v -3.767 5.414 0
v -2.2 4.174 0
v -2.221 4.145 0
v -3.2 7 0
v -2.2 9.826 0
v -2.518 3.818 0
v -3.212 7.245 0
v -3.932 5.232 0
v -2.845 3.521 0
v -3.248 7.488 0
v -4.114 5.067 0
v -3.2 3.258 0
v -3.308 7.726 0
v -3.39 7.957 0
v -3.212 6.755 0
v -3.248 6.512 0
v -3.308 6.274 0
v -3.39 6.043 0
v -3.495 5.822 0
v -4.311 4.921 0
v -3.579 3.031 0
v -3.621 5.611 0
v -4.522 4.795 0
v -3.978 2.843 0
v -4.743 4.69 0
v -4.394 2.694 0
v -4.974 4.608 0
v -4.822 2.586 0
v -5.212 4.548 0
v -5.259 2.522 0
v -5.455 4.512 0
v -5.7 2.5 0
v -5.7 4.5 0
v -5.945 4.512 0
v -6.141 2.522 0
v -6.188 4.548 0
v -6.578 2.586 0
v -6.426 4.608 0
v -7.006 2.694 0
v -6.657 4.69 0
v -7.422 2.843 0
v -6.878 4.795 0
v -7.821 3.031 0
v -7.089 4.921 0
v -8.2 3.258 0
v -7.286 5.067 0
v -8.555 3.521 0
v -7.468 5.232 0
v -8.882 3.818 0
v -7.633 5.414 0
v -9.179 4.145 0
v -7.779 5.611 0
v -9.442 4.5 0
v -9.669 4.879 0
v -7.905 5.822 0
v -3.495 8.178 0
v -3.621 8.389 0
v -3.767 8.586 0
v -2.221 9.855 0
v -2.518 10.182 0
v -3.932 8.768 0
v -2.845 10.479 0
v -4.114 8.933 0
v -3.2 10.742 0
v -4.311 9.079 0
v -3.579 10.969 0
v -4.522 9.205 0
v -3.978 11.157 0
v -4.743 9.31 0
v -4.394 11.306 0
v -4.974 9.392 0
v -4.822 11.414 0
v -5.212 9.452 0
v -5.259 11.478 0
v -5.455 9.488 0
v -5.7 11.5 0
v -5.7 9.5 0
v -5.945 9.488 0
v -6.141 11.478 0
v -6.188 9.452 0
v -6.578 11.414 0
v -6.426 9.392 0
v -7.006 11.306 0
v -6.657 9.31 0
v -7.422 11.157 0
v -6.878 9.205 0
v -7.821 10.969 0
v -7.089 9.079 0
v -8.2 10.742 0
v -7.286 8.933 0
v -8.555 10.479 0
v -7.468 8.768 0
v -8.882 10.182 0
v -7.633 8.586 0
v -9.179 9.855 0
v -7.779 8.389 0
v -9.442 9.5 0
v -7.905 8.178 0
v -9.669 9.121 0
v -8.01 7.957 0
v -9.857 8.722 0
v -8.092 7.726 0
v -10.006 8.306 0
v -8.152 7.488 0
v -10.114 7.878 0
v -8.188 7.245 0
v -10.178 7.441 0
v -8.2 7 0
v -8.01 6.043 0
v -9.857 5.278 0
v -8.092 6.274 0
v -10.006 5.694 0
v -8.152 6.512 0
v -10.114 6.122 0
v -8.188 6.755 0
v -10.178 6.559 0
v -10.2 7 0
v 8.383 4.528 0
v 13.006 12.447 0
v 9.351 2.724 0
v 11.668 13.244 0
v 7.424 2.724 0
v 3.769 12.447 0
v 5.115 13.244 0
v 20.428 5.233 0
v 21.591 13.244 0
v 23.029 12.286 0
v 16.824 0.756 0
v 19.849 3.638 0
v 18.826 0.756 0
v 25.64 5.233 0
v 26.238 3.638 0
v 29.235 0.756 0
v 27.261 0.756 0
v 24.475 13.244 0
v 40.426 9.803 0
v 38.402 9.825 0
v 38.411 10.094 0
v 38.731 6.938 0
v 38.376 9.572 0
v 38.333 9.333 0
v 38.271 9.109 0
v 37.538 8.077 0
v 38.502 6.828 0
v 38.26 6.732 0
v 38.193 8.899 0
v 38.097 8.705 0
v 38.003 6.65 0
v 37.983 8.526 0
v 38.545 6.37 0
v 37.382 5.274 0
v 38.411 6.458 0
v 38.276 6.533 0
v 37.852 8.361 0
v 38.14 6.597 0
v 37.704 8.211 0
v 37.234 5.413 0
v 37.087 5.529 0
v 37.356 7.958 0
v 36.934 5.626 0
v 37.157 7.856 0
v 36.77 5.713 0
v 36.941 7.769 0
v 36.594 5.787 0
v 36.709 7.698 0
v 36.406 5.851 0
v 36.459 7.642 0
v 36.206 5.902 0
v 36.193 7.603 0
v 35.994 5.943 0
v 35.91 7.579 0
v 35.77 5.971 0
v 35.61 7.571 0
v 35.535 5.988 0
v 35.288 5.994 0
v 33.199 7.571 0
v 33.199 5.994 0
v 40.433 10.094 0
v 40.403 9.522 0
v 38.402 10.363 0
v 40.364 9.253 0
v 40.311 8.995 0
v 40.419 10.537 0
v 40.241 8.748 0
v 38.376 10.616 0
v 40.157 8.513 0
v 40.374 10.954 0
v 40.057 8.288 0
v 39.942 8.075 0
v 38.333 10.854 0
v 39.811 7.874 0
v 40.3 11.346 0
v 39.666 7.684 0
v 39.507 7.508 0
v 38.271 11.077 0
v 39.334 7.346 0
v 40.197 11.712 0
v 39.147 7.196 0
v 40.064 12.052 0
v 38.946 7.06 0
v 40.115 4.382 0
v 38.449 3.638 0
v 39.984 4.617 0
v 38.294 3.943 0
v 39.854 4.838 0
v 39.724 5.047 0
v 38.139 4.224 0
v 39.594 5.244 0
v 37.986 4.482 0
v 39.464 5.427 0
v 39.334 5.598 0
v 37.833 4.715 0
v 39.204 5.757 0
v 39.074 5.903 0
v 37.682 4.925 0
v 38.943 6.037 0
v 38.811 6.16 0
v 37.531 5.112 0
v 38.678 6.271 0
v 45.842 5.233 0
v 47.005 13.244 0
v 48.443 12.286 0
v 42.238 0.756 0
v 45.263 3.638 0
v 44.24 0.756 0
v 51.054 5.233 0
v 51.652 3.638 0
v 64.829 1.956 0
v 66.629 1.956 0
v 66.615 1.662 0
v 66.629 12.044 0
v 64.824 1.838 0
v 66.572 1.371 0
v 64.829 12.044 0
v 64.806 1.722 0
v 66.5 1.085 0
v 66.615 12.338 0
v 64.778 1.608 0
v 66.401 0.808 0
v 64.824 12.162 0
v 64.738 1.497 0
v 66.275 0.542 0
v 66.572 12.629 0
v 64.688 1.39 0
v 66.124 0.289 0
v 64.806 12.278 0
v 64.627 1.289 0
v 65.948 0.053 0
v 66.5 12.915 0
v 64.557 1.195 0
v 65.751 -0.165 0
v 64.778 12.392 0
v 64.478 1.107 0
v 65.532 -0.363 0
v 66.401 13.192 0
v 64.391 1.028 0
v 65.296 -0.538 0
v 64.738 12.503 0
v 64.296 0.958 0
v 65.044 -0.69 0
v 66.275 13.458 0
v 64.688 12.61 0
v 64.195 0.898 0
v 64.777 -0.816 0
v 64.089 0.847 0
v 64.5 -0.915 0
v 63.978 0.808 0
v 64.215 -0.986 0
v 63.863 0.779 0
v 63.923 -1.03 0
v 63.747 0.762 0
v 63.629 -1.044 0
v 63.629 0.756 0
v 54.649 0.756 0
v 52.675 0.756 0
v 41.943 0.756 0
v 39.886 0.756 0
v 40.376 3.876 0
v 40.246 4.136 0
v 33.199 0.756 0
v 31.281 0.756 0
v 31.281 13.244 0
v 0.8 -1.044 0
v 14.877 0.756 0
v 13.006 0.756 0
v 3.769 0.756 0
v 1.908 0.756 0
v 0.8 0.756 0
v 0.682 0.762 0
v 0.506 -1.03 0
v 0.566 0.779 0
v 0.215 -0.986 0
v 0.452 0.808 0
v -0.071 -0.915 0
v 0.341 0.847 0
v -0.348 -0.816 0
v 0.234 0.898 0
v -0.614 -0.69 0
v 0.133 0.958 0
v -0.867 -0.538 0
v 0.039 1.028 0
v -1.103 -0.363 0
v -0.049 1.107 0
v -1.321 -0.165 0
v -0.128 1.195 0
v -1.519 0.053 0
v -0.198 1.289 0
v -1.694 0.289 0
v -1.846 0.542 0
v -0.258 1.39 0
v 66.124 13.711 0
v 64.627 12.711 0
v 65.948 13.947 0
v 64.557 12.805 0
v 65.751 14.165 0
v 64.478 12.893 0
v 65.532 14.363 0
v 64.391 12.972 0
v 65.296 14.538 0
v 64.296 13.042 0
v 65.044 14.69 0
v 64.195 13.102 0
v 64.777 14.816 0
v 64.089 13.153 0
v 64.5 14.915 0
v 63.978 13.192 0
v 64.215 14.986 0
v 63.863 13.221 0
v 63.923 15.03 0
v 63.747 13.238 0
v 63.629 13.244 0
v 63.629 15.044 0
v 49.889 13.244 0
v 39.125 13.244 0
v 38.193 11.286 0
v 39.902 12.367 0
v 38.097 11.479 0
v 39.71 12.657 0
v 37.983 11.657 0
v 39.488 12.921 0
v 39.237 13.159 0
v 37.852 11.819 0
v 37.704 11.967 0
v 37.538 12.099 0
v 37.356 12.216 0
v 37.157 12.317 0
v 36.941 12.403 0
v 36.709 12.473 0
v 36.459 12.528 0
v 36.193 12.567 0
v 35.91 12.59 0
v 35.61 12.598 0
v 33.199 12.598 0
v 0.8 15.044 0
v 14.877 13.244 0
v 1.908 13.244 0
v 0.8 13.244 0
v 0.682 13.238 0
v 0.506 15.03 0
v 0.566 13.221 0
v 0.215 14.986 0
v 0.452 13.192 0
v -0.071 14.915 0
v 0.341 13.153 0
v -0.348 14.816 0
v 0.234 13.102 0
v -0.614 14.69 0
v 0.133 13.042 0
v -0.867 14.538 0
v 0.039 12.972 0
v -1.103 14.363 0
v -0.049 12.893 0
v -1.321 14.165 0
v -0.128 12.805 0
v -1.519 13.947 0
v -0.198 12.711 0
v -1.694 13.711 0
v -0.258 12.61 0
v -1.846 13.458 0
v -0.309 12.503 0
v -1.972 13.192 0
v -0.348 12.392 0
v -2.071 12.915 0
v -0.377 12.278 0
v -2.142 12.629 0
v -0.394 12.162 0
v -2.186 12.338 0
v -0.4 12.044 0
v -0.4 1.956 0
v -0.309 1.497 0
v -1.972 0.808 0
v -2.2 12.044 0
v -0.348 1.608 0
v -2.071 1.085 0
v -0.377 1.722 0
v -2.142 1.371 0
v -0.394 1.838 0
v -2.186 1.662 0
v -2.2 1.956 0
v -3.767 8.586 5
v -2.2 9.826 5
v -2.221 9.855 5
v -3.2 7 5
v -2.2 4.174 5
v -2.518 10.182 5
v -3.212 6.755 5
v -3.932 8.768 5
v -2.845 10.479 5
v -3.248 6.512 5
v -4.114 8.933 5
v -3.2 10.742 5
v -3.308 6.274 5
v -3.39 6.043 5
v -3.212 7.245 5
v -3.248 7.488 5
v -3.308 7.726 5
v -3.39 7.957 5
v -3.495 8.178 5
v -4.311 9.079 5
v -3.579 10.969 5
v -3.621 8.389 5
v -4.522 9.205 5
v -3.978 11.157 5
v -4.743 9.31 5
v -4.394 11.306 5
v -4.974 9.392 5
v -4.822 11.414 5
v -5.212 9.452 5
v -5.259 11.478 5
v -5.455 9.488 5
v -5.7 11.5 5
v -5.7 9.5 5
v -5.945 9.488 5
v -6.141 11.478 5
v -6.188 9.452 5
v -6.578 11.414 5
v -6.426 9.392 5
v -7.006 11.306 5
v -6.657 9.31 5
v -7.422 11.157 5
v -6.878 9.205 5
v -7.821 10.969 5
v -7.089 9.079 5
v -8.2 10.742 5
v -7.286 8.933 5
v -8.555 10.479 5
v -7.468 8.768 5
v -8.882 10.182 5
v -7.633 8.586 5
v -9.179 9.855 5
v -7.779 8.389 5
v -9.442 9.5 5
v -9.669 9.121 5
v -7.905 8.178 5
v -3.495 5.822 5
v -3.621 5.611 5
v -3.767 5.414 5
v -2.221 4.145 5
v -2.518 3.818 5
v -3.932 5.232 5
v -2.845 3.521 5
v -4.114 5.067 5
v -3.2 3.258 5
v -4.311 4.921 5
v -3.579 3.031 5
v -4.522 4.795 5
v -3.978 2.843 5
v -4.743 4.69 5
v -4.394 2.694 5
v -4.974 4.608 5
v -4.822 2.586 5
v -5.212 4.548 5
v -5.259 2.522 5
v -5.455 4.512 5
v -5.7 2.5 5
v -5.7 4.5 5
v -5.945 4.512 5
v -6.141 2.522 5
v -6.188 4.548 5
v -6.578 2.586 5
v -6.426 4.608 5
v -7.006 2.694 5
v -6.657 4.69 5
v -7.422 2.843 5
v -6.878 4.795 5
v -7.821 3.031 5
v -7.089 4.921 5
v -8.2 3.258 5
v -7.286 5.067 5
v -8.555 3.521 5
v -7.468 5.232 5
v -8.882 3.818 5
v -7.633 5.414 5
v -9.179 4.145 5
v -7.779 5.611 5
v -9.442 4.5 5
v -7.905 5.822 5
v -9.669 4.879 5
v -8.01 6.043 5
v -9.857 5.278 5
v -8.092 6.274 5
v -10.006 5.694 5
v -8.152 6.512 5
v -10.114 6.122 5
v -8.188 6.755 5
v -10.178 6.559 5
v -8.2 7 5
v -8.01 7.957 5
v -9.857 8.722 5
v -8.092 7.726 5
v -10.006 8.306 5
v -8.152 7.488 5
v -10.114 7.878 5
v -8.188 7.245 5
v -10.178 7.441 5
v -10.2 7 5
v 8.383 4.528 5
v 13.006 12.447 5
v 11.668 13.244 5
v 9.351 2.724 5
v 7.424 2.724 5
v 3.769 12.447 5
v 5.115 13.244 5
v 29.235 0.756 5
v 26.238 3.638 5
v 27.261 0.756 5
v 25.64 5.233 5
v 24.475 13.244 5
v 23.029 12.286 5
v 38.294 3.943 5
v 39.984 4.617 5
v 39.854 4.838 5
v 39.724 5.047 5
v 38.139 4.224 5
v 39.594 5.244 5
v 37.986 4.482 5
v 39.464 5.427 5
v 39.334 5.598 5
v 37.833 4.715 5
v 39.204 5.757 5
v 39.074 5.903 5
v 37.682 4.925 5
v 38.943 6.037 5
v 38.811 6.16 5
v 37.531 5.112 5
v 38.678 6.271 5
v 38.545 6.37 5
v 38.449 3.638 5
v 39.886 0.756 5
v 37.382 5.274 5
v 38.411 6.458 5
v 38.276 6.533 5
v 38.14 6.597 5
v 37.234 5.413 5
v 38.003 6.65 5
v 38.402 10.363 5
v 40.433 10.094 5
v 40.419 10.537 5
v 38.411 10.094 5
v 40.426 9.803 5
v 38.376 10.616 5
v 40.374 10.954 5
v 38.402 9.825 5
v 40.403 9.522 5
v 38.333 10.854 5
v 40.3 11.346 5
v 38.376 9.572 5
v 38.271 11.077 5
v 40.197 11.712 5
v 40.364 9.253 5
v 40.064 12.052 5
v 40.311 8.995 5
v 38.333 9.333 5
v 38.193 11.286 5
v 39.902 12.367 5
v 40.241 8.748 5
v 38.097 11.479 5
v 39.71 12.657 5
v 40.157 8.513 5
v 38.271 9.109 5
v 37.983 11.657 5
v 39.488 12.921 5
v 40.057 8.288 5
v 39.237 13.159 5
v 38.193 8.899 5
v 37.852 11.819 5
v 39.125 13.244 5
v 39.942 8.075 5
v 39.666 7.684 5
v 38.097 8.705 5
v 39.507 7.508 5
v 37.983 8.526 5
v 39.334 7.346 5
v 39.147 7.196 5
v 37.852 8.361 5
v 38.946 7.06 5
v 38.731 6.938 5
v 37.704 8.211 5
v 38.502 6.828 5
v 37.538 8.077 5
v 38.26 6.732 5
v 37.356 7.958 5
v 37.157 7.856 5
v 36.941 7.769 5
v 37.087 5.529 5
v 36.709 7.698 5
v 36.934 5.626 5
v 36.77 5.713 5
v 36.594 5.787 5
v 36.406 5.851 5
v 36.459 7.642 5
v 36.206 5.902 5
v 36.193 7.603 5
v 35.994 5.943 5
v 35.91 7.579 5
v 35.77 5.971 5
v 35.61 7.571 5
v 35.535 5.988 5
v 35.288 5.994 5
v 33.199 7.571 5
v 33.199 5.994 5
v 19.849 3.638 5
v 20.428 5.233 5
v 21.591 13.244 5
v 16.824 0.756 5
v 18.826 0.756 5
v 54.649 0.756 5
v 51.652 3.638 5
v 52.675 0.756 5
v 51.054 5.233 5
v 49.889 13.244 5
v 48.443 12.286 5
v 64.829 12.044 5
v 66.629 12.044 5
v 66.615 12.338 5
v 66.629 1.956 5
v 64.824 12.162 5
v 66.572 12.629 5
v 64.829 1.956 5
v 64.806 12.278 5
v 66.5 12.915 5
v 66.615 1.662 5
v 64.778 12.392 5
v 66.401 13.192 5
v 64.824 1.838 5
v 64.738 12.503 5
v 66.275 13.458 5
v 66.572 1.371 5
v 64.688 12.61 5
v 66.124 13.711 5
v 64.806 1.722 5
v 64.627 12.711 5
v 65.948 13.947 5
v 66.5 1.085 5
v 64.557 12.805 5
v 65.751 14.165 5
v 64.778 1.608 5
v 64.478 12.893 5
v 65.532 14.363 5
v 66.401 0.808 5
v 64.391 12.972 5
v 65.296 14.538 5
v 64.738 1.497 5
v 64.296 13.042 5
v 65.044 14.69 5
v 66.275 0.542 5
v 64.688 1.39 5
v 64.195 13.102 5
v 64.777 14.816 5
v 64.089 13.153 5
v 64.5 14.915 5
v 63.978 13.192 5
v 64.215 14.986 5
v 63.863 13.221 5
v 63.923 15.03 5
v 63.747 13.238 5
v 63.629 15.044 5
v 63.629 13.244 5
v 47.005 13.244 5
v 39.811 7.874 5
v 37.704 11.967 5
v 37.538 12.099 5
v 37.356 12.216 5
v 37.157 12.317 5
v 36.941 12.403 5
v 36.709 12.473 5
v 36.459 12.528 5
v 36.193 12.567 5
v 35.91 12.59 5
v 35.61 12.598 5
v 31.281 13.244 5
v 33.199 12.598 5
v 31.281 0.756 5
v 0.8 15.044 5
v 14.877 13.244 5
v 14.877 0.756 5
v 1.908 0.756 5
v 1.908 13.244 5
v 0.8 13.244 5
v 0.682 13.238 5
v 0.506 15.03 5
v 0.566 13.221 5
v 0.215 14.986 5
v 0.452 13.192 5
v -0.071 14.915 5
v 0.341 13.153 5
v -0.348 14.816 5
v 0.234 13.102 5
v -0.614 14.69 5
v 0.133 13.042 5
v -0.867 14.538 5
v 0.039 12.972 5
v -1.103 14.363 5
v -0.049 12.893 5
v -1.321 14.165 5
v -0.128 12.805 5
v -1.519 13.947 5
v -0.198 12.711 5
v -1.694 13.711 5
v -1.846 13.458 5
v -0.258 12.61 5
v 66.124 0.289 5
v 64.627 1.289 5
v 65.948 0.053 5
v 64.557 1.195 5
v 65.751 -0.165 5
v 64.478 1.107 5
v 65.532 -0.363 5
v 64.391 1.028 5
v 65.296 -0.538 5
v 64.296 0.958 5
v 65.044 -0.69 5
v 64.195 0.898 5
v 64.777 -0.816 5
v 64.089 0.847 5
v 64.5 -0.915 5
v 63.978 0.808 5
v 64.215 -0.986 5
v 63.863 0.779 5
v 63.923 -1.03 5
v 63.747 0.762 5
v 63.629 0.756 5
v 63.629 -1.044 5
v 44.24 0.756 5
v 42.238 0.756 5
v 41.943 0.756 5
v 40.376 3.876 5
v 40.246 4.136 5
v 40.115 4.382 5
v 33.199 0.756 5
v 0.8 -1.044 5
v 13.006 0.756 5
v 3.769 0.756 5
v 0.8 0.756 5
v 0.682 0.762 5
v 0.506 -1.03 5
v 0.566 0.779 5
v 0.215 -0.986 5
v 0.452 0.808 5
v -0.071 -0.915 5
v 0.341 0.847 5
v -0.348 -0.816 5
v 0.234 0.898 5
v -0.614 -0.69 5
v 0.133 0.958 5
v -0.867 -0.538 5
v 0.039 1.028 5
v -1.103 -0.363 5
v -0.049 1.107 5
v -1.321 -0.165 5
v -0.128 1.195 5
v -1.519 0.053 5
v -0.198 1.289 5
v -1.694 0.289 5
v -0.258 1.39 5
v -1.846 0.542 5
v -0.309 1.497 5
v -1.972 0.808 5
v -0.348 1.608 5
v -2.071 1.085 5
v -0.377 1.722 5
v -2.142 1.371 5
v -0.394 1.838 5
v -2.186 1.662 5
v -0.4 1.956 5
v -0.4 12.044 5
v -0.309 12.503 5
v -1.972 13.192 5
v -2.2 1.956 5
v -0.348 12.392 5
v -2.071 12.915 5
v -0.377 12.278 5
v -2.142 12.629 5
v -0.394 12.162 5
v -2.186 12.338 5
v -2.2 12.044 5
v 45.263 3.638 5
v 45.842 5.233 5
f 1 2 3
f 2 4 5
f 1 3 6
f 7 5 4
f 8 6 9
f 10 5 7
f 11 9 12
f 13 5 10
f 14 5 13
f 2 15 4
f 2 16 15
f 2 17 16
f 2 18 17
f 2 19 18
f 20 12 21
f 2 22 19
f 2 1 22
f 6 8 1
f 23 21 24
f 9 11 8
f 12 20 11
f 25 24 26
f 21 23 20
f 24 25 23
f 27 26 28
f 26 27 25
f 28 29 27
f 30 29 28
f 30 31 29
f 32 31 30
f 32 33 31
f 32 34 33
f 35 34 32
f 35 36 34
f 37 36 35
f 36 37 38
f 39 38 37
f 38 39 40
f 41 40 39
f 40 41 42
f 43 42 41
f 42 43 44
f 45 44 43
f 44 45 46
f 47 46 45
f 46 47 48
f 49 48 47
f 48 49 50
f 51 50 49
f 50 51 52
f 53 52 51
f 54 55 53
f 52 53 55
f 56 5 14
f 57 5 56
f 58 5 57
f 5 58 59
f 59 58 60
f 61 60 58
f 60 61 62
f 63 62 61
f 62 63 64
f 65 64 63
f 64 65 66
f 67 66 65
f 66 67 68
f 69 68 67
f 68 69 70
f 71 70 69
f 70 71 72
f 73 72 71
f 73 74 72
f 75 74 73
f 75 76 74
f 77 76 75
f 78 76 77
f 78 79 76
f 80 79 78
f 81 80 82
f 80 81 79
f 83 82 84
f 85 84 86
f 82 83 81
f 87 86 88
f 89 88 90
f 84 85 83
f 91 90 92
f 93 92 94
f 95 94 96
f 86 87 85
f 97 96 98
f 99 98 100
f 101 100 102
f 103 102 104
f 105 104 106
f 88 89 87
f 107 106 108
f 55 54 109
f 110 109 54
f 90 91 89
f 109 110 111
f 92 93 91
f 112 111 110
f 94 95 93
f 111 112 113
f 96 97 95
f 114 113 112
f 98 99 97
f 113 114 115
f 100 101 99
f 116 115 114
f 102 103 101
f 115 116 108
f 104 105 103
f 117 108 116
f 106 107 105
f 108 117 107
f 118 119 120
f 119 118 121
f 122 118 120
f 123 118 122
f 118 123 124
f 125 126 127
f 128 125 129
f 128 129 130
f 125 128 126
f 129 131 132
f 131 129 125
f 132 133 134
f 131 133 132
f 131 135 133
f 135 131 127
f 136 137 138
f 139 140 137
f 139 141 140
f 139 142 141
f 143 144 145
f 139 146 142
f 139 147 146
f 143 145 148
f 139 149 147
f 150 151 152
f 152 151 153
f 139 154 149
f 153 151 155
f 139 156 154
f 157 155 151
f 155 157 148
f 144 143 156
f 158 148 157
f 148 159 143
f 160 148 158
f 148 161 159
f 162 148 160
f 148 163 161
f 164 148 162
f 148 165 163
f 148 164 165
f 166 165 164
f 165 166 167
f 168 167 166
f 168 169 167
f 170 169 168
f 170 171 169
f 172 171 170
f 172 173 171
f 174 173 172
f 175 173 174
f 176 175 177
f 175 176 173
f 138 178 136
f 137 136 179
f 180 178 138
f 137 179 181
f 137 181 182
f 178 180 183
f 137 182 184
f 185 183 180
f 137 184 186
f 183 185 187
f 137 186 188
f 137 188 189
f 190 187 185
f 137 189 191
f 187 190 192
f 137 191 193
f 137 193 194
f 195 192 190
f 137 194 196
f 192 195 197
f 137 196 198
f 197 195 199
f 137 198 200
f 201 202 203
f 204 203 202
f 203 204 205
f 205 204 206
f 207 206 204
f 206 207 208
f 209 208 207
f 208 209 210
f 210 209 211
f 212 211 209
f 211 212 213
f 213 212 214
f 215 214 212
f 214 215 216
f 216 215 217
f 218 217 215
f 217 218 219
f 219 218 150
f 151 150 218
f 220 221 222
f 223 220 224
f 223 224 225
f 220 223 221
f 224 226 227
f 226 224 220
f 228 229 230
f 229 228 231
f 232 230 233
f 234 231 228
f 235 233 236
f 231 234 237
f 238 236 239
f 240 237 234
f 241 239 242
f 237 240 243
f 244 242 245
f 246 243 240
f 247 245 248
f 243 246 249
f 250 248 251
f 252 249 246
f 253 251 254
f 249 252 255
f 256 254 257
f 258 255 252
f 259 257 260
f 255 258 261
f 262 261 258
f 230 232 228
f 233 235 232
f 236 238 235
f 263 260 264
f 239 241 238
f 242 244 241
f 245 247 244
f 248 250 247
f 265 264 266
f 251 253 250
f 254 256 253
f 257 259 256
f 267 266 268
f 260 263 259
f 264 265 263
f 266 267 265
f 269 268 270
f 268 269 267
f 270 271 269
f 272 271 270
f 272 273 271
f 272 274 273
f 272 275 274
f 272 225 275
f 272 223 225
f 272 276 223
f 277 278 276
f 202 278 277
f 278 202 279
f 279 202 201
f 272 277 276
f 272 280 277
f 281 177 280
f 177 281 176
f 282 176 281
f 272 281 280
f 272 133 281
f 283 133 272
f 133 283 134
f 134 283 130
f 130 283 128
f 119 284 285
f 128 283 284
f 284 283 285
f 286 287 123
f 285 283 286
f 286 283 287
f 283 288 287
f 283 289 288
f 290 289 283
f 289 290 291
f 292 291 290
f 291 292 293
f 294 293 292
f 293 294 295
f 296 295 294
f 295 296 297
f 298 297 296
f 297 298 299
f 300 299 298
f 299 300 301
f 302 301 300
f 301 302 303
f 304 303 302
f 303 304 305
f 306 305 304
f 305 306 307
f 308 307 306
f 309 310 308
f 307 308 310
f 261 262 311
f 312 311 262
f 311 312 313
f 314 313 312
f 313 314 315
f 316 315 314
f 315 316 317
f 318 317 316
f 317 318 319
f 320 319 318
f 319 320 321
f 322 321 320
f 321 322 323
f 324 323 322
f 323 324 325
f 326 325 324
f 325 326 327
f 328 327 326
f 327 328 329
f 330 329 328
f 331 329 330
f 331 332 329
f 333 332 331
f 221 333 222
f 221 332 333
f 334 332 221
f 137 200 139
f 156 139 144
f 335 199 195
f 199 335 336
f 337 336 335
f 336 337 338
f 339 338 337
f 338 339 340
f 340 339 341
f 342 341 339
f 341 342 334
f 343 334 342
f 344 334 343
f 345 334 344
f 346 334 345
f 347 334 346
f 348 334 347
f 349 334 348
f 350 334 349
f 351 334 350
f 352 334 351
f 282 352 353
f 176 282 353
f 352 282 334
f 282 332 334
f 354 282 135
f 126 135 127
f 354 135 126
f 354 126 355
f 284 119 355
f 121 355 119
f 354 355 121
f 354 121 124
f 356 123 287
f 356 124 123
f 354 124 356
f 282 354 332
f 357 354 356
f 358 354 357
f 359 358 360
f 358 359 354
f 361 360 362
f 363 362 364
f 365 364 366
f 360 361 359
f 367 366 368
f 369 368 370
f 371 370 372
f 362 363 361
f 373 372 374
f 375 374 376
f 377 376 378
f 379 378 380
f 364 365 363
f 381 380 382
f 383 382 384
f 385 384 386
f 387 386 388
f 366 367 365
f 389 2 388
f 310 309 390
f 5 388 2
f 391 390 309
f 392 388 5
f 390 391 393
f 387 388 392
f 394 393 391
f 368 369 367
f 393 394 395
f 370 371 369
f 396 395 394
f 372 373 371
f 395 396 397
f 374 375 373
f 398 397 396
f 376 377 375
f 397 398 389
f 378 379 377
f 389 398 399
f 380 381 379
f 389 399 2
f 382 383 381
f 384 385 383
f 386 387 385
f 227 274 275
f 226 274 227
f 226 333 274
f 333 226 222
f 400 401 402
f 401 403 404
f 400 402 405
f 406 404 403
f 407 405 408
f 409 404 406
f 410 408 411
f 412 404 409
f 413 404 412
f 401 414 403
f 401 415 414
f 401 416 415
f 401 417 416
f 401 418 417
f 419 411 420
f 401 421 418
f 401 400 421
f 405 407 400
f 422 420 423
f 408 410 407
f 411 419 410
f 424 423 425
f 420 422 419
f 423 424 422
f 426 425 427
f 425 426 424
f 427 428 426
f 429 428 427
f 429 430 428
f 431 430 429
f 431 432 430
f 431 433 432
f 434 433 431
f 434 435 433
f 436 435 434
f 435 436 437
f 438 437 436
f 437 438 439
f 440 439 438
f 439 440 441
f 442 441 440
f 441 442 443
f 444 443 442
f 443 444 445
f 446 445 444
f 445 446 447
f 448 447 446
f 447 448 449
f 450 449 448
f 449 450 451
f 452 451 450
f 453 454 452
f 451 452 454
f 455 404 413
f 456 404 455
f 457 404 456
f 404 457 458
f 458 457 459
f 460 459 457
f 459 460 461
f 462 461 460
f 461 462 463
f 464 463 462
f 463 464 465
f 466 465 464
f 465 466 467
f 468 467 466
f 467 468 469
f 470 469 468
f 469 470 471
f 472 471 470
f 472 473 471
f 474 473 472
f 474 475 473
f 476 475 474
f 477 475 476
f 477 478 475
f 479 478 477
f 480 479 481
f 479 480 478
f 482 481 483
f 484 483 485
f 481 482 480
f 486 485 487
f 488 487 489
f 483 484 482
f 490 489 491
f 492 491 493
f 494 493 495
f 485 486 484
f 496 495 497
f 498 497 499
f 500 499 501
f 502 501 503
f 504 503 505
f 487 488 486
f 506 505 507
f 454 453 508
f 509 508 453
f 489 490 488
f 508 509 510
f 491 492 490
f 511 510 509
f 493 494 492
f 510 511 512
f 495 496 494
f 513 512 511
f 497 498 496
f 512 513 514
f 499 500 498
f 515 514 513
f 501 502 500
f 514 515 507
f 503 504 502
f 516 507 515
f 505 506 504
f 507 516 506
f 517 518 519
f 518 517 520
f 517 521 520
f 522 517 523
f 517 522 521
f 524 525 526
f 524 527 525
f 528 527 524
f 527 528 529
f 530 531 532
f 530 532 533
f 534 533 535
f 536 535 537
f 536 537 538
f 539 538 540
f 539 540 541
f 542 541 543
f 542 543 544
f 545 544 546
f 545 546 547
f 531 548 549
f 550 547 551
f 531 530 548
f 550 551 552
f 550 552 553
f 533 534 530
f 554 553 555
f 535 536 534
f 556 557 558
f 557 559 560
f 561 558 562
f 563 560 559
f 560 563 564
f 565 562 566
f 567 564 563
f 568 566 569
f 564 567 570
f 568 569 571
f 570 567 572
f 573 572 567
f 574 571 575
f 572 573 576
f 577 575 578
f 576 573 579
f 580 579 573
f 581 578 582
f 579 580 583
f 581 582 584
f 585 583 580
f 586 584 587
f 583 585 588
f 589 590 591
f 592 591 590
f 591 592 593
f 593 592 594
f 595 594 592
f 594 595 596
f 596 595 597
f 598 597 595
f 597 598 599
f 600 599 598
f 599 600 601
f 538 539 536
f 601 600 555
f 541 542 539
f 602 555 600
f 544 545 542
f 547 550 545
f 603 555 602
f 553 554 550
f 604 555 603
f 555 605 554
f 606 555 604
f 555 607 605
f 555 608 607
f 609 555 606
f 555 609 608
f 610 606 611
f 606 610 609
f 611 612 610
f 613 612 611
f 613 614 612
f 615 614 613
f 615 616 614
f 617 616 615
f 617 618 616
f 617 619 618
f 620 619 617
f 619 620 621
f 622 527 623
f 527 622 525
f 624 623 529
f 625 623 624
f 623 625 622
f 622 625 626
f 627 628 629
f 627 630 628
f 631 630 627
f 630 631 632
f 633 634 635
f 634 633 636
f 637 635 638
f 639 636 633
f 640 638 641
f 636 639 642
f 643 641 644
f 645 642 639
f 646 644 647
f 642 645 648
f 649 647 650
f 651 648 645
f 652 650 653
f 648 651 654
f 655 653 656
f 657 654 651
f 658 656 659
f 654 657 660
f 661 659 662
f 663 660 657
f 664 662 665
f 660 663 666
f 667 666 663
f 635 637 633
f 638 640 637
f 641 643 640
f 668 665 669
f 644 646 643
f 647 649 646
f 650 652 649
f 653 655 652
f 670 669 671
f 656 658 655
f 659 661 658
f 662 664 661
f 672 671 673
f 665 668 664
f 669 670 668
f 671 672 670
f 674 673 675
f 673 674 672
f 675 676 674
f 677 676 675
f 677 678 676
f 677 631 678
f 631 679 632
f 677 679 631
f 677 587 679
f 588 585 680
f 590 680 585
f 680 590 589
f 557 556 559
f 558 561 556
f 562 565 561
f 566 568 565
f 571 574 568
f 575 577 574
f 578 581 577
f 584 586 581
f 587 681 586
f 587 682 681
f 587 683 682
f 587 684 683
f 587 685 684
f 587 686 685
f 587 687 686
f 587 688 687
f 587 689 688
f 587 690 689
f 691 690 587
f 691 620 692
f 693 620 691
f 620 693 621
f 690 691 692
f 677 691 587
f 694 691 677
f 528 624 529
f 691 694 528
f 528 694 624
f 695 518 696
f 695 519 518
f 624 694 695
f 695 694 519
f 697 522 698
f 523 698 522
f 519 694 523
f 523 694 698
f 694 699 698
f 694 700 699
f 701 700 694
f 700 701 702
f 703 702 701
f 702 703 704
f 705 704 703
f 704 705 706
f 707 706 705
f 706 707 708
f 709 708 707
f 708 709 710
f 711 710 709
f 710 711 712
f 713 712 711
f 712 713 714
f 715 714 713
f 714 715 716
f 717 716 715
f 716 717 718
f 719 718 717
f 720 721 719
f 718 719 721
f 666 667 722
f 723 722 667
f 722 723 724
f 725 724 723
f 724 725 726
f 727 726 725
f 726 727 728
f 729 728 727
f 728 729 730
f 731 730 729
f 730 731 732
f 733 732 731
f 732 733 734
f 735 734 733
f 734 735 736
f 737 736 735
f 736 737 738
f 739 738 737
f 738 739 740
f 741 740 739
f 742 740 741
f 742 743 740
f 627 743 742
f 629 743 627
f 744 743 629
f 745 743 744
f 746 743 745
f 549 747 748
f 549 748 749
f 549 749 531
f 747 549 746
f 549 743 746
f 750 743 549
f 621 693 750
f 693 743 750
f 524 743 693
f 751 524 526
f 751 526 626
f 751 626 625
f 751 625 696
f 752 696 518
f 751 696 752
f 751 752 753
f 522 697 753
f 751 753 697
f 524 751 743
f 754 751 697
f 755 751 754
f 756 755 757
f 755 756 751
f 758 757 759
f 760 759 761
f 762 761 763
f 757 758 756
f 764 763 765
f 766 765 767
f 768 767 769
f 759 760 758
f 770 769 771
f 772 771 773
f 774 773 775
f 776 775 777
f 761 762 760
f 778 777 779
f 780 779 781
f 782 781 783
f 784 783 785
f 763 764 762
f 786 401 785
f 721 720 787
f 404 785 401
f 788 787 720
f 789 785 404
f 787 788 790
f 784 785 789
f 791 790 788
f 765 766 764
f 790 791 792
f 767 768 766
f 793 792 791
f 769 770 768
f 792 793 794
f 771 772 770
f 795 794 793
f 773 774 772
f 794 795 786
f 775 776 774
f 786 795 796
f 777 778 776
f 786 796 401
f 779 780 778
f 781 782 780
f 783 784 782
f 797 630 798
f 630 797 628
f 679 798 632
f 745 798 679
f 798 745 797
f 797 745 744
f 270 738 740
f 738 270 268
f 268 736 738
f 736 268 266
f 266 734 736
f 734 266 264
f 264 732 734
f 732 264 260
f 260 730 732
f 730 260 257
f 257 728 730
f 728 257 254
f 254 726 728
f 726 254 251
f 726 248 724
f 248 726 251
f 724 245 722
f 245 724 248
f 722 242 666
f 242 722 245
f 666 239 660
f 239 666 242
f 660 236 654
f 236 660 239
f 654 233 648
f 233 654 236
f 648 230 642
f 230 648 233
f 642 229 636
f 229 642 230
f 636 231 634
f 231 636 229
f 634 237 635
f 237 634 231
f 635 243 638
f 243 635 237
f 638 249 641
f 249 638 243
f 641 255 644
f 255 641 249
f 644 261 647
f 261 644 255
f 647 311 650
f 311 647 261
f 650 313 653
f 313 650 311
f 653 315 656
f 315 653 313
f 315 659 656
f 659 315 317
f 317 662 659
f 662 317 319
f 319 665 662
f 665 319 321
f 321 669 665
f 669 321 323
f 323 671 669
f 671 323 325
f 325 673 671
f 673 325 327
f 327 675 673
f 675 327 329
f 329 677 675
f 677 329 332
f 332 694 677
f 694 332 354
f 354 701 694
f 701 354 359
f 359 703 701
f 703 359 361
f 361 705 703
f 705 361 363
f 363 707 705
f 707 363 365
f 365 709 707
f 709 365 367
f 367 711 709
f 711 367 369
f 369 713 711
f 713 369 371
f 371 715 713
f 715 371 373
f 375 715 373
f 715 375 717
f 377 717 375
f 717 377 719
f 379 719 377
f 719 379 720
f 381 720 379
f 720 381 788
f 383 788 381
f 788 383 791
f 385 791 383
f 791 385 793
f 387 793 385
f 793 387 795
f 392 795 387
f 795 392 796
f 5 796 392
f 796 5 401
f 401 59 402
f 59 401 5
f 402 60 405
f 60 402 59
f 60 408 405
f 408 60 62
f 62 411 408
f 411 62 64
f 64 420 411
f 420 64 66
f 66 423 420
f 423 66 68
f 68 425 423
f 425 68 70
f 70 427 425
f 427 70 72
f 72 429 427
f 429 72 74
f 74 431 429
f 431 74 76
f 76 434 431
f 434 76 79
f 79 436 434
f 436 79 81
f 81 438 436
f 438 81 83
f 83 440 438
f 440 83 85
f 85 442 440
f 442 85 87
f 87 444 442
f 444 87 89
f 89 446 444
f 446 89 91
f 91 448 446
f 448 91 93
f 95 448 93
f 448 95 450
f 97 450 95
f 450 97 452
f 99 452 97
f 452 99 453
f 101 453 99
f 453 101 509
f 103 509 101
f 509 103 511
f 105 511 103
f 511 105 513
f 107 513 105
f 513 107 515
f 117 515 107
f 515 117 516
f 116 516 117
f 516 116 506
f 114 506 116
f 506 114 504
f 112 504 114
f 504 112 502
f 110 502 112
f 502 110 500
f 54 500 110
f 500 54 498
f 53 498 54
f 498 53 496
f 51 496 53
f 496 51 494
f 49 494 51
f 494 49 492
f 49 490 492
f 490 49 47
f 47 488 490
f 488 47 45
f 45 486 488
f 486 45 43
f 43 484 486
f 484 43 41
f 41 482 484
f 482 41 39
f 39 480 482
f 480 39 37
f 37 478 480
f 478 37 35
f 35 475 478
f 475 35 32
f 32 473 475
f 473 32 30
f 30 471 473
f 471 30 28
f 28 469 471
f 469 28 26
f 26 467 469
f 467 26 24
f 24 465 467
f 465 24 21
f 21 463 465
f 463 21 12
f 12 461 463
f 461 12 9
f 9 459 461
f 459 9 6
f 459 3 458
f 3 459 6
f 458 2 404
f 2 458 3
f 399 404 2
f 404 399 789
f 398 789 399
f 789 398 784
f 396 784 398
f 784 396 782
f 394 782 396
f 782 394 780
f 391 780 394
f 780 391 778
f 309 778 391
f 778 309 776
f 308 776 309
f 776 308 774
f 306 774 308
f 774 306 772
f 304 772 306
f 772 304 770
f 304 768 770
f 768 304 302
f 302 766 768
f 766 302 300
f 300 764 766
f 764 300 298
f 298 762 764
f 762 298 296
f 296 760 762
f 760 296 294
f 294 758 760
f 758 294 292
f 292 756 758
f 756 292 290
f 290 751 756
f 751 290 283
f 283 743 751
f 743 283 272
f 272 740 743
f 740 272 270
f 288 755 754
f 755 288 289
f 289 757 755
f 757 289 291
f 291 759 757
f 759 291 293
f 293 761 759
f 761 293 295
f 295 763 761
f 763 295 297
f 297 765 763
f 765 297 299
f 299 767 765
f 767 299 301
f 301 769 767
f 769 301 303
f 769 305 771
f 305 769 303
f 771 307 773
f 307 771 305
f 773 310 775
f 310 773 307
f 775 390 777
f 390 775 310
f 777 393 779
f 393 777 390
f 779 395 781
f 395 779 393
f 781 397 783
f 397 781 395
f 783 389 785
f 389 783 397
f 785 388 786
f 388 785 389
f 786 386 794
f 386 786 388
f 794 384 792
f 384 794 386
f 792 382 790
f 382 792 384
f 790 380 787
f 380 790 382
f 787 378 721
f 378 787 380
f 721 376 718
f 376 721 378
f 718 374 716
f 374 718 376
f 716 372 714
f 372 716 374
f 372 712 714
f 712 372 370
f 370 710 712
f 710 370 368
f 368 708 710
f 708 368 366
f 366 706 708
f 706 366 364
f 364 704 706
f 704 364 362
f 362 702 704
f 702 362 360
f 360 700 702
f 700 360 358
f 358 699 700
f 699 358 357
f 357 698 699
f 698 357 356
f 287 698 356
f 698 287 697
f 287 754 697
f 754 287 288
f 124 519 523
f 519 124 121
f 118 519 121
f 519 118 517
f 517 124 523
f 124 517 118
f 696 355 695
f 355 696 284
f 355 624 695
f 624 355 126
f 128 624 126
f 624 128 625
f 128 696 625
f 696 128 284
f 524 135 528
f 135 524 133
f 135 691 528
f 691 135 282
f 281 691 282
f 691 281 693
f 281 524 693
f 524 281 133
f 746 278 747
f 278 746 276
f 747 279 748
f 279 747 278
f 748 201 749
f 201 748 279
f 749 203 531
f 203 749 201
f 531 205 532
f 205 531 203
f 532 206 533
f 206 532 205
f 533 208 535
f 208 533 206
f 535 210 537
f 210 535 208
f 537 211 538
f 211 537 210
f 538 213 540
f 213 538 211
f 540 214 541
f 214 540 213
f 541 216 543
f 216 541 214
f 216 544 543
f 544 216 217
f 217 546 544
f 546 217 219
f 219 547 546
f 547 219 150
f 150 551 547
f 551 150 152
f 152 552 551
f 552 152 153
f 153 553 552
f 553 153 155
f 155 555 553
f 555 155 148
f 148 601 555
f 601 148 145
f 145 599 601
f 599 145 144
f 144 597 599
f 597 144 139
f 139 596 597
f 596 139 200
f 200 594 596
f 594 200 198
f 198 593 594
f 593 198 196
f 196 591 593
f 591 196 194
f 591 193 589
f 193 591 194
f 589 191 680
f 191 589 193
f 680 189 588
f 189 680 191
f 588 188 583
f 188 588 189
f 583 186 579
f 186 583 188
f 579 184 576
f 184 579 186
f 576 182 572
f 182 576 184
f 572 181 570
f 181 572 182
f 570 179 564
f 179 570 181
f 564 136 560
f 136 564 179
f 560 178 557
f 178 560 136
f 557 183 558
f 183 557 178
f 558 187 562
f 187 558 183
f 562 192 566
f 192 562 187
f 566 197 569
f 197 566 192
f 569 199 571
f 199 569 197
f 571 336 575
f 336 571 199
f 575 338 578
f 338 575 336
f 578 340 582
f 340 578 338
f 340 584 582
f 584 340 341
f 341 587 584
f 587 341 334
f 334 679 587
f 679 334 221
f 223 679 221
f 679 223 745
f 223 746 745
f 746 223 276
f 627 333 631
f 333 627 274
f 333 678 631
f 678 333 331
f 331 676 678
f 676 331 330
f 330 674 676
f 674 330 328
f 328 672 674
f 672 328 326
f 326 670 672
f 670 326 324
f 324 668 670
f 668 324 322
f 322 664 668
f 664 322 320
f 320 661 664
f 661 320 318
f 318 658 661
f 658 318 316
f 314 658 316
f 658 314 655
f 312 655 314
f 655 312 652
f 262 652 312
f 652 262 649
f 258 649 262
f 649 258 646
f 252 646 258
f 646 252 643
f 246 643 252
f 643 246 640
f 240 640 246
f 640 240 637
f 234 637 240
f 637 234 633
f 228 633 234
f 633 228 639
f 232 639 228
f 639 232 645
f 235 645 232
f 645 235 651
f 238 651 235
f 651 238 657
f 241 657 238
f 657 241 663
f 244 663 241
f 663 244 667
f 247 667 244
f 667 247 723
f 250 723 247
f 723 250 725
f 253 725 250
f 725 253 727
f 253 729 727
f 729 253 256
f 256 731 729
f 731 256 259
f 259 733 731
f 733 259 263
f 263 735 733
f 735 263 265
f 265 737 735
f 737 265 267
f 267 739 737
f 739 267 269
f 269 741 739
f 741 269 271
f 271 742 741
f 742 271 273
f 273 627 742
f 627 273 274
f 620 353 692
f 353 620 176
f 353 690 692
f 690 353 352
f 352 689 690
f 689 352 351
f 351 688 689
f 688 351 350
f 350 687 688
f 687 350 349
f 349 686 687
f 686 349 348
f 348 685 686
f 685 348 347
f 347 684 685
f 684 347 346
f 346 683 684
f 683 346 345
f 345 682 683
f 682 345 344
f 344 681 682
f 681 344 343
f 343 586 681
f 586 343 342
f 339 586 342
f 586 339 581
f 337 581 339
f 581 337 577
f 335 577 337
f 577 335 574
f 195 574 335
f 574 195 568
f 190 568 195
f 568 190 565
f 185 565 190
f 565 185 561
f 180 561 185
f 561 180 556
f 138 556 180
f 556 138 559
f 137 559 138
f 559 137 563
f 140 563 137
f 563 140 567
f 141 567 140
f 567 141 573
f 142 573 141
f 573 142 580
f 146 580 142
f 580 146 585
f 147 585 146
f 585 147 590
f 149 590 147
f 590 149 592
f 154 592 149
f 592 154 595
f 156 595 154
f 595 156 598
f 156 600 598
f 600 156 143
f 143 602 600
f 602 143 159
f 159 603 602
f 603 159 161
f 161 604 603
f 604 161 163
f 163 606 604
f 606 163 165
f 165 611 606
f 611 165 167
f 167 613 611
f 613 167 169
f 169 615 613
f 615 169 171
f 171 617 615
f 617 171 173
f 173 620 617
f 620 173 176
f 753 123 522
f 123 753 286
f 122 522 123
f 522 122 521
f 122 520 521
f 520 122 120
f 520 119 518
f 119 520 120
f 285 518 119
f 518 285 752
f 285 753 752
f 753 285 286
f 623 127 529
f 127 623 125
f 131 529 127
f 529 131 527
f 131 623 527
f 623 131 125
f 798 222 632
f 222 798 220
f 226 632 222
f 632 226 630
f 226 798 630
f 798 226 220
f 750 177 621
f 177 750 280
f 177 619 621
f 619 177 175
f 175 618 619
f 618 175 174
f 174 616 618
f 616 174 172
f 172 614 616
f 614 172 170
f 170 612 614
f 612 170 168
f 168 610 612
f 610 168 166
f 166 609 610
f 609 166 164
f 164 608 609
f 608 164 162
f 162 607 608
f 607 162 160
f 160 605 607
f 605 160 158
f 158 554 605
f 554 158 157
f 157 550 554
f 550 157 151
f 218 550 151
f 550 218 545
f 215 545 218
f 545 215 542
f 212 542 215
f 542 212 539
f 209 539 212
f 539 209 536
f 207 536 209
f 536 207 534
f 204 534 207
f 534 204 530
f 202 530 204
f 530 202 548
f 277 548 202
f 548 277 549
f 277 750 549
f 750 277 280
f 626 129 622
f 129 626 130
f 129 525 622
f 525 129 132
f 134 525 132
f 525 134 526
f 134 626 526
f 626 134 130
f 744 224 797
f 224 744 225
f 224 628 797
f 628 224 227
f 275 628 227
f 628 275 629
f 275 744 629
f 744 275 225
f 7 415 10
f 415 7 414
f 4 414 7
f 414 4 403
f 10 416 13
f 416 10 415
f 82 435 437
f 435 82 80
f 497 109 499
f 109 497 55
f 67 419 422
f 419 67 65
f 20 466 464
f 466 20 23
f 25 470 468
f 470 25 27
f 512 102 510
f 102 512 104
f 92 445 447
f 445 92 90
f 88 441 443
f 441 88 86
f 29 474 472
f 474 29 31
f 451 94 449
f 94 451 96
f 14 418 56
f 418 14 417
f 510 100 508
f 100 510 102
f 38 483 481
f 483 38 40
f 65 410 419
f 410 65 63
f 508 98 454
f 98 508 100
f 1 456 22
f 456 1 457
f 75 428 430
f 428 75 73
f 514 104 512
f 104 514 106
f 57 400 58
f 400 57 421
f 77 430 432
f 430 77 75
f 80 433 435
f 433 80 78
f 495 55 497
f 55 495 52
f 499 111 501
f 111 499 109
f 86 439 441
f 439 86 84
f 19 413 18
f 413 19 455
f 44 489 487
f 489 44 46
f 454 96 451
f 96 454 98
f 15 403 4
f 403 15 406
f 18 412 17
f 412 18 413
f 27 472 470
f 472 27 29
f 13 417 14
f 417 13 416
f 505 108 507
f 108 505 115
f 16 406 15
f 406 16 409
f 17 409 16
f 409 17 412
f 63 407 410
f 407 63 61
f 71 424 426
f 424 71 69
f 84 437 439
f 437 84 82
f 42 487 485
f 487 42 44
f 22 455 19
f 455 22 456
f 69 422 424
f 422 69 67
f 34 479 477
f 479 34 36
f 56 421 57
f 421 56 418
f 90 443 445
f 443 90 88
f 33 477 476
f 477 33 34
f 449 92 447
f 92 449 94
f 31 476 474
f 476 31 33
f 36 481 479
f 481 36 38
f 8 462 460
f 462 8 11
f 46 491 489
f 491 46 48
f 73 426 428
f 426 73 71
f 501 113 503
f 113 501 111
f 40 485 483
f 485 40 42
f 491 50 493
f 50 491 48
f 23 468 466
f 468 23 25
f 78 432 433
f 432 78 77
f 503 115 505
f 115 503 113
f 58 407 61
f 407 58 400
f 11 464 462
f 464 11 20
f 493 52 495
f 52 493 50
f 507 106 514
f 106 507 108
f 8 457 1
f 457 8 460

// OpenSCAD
// KeyForge parametric framed-name keychain.
// A dynamically sized rounded frame provides top, bottom, left, and right rails.
// Every A-Z/0-9 glyph overlaps the top and bottom rails, keeping the part connected.
// CLI: openscad -o out.stl -D name="ASHIM" keychain.scad

name = "MARA";
font = "Arial Black";

$fn = 64;

// ---- printable dimensions (millimetres) ----
letter_size = 14;
part_height = 5;
letter_spacing = 1.0;

rail_width = 1.8;
side_margin = 2.2;
corner_radius = 3.0;

// In OpenSCAD, text(size=...) maps this font's cap height to the requested size.
// Placing the rails across the baseline and cap line makes every supported glyph
// physically overlap both rails instead of merely appearing to touch them.
cap_height = letter_size;
frame_bottom = -rail_width * 0.58;
frame_top = cap_height + rail_width * 0.58;
frame_height = frame_top - frame_bottom;

hole_d = 5;
ring_wall = 2.0;
ring_od = hole_d + 2 * ring_wall;
ring_overlap = 1.0;

// Advance widths from the Arial Black font, expressed in em units. OpenSCAD
// 2021 has no text-metrics function, so this keeps the frame fitted to the name.
// Arial Black's cap height is 71.6% of its em square; OpenSCAD's requested text
// size maps to that cap height, hence the conversion below.
cap_to_em = 0.716;
supported = "ABCDEFGHIJKLMNOPQRSTUVWXYZ0123456789";
advances = [
  0.7778, 0.7778, 0.7778, 0.7778, 0.7222, 0.6670, 0.8330,
  0.8330, 0.3892, 0.6670, 0.8330, 0.6670, 0.9438, 0.8330,
  0.8330, 0.7222, 0.8330, 0.7778, 0.7222, 0.7222, 0.8330,
  0.7778, 1.0000, 0.7778, 0.7778, 0.7222,
  0.6670, 0.6670, 0.6670, 0.6670, 0.6670,
  0.6670, 0.6670, 0.6670, 0.6670, 0.6670
];

function glyph_advance(character) =
  let(matches = search(character, supported))
  len(matches) > 0 ? advances[matches[0]] : 0.8;

function name_advance(value, index = 0) =
  index >= len(value)
    ? 0
    : glyph_advance(value[index]) + name_advance(value, index + 1);

// OpenSCAD applies spacing to glyph placement. A small tolerance covers the
// font's right side-bearing and prevents the final letter touching the wall.
text_width = letter_size * letter_spacing * name_advance(name) / cap_to_em + 0.35;
frame_left = -side_margin;
frame_right = text_width + side_margin;
frame_width = frame_right - frame_left;
ring_center = [frame_left - ring_od / 2 + ring_overlap, frame_bottom + frame_height / 2];

module keychain_text() {
  text(
    name,
    size = letter_size,
    font = font,
    halign = "left",
    valign = "baseline",
    spacing = letter_spacing
  );
}

module rounded_rectangle(width, height, radius) {
  hull() {
    for (x = [radius, width - radius])
      for (y = [radius, height - radius])
        translate([x, y]) circle(r = radius);
  }
}

module frame_outline() {
  translate([frame_left, frame_bottom])
    difference() {
      rounded_rectangle(frame_width, frame_height, corner_radius);
      translate([rail_width, rail_width])
        rounded_rectangle(
          frame_width - 2 * rail_width,
          frame_height - 2 * rail_width,
          max(0.01, corner_radius - rail_width)
        );
    }
}

module solid_2d() {
  union() {
    keychain_text();
    frame_outline();
    translate(ring_center) circle(d = ring_od);
  }
}

module framed_name_keychain() {
  difference() {
    linear_extrude(part_height) solid_2d();
    translate([ring_center.x, ring_center.y, -1])
      cylinder(d = hole_d, h = part_height + 2);
  }
}

// color() affects previews only; STL and G-code keep the printer's filament color.
color([0.96, 0.79, 0.12]) framed_name_keychain();
